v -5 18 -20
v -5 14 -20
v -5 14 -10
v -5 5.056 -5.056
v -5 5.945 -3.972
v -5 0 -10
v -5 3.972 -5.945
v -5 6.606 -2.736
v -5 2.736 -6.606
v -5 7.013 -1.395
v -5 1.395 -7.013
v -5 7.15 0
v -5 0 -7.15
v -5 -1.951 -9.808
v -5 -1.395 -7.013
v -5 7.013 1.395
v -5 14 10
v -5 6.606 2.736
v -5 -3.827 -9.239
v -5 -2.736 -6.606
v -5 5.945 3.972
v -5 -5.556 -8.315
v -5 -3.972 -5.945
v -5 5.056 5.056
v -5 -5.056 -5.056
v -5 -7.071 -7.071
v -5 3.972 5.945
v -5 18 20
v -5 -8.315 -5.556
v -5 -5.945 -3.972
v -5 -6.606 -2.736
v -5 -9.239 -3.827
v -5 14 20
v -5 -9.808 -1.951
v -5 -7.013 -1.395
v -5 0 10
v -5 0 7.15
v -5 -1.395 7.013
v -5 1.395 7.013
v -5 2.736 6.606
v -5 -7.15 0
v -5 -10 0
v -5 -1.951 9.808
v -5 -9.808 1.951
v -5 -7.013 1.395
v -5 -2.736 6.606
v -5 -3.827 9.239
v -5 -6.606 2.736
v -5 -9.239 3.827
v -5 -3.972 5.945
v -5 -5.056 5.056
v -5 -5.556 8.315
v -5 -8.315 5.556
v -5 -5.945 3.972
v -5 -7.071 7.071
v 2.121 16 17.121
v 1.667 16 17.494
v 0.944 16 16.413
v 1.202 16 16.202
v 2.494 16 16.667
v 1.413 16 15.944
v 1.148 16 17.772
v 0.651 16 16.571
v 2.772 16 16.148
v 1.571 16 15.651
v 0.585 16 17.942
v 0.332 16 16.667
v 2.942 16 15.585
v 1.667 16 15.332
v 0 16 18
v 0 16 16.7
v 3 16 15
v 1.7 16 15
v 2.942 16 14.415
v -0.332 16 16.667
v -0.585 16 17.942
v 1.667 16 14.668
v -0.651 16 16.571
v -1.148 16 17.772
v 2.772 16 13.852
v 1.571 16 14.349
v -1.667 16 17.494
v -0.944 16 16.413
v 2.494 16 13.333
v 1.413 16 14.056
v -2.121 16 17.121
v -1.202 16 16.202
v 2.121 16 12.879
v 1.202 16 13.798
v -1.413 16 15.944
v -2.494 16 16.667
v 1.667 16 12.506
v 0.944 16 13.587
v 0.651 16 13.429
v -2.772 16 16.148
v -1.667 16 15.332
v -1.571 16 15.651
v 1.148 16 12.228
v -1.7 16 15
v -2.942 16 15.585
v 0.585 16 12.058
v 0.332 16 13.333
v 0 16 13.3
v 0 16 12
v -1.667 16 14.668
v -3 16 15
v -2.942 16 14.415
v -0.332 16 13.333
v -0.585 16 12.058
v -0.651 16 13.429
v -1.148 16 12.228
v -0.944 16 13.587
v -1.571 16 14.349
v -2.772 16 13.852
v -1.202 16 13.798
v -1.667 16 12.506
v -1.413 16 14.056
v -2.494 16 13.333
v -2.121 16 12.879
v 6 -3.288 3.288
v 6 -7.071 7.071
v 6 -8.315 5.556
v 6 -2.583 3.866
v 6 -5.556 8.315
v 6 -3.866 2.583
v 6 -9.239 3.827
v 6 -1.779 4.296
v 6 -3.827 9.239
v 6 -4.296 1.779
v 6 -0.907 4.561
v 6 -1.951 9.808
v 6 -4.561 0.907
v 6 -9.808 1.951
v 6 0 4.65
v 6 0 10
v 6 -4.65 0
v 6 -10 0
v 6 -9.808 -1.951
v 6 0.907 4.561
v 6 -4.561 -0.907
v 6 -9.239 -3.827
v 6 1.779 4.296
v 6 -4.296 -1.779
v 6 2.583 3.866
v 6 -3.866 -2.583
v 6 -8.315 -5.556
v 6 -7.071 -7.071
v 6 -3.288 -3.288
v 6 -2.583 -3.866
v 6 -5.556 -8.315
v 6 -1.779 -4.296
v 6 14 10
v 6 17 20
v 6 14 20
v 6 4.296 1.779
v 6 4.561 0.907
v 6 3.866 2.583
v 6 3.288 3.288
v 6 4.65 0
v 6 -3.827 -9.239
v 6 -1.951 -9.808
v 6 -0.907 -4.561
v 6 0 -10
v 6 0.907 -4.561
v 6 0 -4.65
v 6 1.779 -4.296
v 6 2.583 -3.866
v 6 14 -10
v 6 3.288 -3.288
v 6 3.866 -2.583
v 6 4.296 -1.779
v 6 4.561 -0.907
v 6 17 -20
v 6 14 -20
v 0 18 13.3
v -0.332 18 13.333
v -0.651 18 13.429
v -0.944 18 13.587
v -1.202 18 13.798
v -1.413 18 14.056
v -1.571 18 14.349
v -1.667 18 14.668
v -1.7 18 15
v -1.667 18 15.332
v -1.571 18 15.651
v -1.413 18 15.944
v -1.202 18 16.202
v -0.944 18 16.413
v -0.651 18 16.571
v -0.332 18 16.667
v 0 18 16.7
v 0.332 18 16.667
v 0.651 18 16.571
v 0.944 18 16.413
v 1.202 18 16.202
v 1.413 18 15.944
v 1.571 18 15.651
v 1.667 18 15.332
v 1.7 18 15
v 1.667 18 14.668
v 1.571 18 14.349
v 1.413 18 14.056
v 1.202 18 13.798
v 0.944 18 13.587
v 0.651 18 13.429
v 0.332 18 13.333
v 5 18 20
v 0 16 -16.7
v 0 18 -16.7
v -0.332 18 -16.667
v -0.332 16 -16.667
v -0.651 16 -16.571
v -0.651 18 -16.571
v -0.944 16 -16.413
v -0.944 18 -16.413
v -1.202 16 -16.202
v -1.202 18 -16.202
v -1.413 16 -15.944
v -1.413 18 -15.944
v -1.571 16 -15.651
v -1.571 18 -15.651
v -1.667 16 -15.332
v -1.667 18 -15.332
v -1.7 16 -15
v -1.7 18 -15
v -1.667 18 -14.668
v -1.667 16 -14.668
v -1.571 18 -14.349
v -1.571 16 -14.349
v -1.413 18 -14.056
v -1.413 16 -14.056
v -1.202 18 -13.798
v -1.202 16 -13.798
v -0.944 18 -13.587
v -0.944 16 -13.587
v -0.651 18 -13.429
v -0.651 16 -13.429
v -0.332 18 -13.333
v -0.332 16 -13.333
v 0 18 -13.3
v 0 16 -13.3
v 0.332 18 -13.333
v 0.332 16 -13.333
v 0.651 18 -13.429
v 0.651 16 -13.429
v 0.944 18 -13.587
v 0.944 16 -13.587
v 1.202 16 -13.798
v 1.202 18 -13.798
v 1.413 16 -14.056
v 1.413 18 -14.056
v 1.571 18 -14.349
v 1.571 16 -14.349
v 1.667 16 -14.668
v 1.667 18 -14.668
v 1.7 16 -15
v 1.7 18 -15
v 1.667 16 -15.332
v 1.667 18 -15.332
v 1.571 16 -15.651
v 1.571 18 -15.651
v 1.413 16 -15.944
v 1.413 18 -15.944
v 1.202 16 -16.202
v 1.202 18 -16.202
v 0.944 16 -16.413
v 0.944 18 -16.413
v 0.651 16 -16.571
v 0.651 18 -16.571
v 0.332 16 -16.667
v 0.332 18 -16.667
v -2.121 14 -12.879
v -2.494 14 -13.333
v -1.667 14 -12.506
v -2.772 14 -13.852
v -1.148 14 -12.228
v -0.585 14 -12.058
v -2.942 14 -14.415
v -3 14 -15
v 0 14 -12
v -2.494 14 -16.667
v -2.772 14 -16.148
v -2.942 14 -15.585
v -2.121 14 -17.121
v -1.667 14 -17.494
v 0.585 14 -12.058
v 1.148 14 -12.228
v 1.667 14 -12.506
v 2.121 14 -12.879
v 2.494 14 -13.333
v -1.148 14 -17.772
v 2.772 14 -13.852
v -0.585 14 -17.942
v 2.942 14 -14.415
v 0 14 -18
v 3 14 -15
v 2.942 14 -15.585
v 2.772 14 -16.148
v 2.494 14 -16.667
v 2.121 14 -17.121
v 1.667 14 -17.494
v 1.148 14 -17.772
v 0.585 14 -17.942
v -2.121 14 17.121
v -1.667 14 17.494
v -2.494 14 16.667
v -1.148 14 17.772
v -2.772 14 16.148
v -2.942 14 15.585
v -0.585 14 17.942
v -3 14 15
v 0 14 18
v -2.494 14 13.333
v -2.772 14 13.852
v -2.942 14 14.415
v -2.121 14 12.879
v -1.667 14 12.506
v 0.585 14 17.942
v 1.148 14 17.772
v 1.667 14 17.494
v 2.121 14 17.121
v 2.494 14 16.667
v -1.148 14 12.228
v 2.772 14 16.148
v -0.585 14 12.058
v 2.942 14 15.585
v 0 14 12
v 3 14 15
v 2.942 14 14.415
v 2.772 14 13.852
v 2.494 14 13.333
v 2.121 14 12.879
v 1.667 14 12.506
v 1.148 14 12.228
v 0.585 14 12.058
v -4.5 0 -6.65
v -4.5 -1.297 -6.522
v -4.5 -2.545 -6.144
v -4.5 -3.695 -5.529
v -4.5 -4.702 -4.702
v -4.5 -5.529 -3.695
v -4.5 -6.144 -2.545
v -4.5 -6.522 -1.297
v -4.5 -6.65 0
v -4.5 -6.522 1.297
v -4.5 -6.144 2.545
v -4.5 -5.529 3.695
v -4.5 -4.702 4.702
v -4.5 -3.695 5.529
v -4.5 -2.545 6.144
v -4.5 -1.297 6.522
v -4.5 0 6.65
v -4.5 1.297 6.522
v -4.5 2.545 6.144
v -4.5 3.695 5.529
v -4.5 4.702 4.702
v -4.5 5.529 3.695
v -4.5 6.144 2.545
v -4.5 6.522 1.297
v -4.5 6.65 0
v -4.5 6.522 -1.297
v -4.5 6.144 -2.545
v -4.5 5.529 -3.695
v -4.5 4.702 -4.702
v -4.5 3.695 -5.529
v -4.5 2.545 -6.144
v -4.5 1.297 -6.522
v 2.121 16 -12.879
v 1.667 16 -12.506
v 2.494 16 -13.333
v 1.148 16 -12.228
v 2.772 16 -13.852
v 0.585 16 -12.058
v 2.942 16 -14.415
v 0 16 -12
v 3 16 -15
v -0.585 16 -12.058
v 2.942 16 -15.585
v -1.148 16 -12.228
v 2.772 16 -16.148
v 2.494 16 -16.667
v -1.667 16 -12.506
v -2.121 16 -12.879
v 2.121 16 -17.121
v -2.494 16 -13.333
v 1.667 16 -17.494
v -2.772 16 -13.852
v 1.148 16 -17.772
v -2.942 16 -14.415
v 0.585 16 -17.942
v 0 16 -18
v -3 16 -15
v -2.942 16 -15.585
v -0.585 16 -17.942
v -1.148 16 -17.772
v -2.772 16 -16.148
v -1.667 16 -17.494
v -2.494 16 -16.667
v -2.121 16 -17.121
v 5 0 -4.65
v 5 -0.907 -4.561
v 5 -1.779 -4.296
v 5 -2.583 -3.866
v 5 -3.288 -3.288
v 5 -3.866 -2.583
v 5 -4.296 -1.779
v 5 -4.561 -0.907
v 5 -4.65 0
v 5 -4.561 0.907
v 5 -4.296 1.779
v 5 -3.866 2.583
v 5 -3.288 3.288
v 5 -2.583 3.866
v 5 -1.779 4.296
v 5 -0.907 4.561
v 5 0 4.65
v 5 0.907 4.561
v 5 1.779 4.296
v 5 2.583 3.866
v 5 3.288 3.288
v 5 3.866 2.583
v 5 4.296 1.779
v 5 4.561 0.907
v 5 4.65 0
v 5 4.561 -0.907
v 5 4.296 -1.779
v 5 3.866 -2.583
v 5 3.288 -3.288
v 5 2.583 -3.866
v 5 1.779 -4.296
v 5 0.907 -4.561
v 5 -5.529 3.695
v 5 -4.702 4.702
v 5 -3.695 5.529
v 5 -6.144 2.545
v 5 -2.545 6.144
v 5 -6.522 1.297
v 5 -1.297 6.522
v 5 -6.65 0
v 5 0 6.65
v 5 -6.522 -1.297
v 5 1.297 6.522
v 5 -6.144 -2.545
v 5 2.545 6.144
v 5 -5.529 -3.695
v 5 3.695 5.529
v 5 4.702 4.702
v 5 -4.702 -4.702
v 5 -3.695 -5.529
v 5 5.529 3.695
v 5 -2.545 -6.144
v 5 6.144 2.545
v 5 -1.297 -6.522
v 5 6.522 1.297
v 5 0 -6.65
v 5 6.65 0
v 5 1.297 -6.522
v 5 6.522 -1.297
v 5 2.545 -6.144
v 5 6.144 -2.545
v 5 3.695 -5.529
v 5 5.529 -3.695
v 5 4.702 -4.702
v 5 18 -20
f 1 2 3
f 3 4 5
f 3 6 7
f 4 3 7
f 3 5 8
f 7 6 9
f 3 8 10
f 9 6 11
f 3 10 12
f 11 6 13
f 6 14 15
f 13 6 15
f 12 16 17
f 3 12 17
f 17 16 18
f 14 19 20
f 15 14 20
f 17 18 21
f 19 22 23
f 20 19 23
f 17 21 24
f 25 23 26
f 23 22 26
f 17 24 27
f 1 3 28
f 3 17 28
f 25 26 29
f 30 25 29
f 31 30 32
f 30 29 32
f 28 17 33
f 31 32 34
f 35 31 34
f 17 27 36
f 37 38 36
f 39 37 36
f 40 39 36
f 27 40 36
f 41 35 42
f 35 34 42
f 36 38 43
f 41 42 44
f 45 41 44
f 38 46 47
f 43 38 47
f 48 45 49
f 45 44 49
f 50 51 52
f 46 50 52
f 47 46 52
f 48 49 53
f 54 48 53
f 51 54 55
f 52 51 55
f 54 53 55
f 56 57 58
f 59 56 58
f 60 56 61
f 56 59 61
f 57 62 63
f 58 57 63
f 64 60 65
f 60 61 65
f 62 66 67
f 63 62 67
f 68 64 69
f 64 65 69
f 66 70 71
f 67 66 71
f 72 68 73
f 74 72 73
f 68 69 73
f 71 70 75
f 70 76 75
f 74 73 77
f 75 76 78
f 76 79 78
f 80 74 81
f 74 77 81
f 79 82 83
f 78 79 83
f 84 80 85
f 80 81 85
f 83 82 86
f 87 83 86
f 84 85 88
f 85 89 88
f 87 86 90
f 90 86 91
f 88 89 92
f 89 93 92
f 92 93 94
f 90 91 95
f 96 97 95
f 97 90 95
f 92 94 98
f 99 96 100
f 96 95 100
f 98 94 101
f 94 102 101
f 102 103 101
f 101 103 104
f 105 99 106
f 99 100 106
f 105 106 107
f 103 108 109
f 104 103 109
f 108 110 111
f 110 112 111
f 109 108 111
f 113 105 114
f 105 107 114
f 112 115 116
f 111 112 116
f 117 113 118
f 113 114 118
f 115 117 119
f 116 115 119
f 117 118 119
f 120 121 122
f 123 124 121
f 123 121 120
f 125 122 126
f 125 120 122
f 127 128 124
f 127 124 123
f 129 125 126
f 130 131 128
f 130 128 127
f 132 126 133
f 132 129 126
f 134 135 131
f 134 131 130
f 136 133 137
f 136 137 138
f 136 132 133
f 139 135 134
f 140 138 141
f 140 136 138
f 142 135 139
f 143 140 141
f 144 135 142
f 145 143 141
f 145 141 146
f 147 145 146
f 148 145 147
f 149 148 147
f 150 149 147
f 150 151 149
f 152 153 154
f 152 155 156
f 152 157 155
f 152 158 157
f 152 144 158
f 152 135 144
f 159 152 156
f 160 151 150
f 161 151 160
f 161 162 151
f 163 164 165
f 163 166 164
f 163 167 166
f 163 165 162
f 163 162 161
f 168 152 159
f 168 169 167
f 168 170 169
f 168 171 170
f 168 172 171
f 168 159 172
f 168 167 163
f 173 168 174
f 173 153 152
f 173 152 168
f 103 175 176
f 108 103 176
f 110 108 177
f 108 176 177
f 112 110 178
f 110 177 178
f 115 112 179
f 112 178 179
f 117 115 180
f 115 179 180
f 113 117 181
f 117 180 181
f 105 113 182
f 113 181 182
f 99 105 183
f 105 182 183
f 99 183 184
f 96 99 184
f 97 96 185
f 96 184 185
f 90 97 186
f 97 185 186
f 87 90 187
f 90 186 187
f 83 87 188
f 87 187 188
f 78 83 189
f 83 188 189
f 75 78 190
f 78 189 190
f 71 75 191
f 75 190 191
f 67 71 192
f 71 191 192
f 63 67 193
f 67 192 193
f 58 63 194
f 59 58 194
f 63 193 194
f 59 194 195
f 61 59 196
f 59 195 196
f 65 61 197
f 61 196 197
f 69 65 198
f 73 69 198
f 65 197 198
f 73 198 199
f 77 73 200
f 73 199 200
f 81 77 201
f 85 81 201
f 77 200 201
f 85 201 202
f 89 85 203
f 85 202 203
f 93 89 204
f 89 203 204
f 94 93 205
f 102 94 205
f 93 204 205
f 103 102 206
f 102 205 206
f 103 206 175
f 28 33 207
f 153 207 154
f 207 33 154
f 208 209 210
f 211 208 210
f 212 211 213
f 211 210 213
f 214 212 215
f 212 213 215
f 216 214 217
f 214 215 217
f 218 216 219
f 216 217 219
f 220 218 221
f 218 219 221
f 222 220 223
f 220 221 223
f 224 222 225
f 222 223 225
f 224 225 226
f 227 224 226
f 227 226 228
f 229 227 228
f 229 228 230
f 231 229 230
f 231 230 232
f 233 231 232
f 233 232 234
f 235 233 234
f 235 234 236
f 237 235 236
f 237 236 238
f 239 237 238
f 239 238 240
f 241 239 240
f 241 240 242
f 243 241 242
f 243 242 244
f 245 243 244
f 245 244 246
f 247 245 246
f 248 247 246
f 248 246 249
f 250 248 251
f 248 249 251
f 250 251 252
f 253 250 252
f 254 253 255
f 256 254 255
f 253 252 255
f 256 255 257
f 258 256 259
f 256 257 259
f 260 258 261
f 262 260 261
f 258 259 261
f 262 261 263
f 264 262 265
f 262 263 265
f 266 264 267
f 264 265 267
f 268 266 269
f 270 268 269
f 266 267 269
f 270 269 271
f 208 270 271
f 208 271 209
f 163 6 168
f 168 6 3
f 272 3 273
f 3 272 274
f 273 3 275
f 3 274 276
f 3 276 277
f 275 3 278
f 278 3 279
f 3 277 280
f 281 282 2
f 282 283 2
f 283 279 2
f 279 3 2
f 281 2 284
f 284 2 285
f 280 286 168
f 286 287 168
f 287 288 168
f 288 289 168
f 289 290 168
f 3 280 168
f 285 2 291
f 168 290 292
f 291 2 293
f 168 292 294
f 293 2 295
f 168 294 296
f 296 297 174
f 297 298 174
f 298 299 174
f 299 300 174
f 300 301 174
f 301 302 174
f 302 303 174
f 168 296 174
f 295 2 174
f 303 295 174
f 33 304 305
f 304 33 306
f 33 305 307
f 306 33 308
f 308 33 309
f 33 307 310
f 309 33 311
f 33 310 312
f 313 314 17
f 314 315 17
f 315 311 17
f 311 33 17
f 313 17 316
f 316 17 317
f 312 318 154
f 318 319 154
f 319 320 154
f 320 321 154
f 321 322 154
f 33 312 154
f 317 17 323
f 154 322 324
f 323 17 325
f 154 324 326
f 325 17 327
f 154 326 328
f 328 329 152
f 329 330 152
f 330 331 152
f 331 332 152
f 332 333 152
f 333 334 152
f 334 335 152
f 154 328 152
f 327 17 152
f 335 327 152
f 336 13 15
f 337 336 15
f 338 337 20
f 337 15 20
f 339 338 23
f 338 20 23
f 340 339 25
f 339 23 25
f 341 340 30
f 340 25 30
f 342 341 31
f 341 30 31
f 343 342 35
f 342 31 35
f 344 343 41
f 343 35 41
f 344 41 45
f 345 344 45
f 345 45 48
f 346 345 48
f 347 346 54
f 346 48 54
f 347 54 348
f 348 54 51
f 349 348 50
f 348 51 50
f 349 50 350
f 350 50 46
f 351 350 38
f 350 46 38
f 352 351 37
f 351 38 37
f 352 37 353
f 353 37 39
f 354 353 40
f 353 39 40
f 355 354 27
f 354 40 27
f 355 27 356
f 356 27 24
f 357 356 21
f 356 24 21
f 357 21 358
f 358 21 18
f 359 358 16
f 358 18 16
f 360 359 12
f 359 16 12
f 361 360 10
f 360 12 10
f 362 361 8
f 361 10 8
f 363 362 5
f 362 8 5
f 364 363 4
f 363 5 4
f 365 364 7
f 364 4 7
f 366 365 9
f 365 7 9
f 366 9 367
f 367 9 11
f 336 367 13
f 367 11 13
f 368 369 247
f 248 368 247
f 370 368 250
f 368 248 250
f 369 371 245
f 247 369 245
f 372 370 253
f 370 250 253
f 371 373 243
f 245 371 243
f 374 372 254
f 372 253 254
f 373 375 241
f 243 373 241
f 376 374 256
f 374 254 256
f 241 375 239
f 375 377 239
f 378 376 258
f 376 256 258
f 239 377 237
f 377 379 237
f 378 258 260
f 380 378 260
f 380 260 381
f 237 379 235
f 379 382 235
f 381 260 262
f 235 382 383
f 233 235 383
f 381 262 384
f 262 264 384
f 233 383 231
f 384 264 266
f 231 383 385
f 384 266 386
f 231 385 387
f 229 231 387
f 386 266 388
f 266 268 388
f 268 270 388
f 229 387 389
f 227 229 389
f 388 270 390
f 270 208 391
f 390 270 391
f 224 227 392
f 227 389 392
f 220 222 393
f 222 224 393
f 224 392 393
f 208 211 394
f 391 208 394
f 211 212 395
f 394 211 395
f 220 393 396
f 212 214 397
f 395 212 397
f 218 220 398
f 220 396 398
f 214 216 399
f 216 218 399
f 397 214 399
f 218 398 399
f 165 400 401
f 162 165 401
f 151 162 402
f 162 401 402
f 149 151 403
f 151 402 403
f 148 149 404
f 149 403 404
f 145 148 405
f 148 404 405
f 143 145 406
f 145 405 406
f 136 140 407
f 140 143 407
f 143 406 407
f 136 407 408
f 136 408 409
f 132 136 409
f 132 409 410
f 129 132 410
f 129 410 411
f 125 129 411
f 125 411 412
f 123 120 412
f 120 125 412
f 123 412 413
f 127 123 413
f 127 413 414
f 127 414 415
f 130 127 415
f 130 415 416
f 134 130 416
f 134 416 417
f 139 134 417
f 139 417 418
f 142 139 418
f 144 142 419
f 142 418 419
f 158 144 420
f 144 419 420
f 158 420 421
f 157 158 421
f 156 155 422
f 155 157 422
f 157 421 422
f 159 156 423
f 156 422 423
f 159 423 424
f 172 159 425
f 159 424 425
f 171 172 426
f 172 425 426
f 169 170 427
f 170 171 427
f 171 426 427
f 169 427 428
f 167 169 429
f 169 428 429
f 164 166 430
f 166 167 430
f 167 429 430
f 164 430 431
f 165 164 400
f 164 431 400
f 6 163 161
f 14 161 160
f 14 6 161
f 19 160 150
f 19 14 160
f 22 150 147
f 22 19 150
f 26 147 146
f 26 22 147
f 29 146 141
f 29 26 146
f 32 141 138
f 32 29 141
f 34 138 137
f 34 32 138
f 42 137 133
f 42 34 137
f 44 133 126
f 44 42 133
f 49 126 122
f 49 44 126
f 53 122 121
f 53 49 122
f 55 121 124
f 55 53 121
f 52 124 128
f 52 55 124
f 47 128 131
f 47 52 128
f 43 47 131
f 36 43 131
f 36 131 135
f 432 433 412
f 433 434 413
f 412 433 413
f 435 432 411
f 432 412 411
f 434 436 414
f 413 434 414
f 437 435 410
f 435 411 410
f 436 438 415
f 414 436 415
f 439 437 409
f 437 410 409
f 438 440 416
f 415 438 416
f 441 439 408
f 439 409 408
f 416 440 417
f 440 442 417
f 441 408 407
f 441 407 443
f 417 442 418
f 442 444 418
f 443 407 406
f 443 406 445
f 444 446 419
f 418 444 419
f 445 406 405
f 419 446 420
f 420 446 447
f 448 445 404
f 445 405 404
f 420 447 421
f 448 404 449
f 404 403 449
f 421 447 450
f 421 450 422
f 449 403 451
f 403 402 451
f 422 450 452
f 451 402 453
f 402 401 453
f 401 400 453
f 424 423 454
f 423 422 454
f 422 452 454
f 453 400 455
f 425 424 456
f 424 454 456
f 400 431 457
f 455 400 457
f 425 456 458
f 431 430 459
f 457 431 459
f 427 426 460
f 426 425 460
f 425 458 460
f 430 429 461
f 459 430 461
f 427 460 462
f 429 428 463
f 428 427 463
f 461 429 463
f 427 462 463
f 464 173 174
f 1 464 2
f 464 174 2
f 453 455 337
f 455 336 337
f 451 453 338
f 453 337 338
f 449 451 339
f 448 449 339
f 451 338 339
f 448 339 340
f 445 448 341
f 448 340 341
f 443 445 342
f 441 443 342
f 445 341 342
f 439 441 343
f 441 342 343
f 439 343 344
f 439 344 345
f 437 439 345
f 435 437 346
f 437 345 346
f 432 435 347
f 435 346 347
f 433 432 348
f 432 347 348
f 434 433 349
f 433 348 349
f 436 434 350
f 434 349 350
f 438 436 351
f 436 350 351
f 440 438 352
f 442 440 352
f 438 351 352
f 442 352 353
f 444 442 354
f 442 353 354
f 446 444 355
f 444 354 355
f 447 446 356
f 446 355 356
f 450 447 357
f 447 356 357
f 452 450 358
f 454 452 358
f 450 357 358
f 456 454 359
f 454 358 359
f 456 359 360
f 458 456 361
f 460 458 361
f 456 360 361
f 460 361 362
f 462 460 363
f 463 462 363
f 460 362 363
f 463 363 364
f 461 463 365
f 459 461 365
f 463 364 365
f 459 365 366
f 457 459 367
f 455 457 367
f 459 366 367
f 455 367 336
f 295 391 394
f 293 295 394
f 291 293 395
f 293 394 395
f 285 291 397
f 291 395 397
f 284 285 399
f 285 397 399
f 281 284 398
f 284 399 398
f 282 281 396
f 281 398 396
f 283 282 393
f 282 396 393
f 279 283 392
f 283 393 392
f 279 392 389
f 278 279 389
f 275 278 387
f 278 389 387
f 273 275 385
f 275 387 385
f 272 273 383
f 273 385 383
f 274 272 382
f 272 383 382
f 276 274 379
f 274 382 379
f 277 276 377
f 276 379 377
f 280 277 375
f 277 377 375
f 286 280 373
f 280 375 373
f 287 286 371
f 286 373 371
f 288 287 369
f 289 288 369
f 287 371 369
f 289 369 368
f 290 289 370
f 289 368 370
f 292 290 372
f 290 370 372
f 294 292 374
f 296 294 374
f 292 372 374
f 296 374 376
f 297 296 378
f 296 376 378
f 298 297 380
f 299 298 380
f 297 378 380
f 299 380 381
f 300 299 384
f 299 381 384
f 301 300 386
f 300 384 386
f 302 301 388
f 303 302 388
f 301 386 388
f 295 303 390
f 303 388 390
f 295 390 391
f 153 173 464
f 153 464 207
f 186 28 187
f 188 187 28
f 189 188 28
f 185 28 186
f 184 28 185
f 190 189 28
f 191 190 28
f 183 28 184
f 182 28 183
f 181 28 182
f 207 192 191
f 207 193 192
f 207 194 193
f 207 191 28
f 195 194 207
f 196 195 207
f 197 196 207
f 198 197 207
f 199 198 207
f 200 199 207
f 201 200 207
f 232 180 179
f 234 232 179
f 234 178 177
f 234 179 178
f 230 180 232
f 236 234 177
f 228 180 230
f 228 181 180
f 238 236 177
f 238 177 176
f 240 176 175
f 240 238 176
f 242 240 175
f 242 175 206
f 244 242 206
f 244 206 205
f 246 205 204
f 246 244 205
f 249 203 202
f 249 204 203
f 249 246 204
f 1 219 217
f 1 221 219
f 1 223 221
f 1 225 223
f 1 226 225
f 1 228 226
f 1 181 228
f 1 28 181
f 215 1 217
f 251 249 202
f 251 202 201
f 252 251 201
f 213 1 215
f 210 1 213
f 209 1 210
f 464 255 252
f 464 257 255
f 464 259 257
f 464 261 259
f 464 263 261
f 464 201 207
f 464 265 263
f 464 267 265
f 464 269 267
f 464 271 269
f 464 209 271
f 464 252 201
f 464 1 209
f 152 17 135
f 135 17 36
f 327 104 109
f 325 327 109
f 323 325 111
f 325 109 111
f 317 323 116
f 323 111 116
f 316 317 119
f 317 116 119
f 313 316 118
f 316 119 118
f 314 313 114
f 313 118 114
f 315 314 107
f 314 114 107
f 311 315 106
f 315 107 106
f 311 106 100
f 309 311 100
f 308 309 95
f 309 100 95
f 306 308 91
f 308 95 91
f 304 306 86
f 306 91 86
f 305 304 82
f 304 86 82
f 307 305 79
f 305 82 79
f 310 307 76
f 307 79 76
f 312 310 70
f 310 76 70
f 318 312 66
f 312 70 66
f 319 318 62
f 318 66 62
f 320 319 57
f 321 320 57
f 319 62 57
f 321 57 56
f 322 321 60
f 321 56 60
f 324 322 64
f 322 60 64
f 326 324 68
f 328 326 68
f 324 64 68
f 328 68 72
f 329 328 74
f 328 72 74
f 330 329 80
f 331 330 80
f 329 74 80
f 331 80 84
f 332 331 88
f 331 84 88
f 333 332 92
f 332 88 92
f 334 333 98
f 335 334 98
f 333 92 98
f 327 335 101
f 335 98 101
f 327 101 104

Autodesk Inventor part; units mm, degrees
ref_plane "YZ Plane" through (0, 0, 0) normal (1, 0, 0) x (0, 1, 0)
ref_plane "XZ Plane" through (0, 0, 0) normal (0, 1, 0) x (-1, 0, 0)
ref_plane "XY Plane" through (0, 0, 0) normal (0, 0, 1) x (1, 0, 0)
sketch "Sketch1" plane through (0, 0, 0) normal (1, 0, 0) x (0, 1, 0)
  line L0 (0, 0) -> (14, 0) construction
  line L1 (0, -10) -> (14, -10)
  line L2 (14, 10) -> (0, 10)
  arc A0 (0, 10) -> (0, -10) centre (0, 0) ccw
  arc A1 (14, -10) -> (14, 10) centre (14, 0) ccw construction
  line L3 (14, 10) -> (14, -10)
  point P0 (7, 0)
  dimension "d2" = 20
  dimension "d1" = 14
extrude "Extrusion1" add sketch "Sketch1" along normal mid plane 10
sketch "Sketch2" plane through (-5, 14, 10) normal (0, 1, 0) x (1, 0, 0)
  line L0 (0, -10) -> (10, -10)
  line L1 (10, -10) -> (10, 30)
  line L2 (10, 30) -> (0, 30)
  line L3 (0, 30) -> (0, -10)
  line L4 (0, 0) -> (0, 20) construction
  line L5 (0, 20) -> (10, 20) construction
  line L6 (10, 20) -> (10, 0) construction
  line L7 (10, 0) -> (0, 0) construction
  line L8 (0, 0) -> (0, 20) construction
  line L9 (10, 20) -> (10, 0) construction
  line L10 (0, 10) -> (10, 10) construction
  point P0 (5, 10)
  dimension "d28" = 40
extrude "Extrusion2" add sketch "Sketch2" along normal blind 4
sketch "Sketch3" plane through (-5, 14, 10) normal (0, -1, 0) x (1, 0, 0)
  line L0 (10, -30) -> (0, -30) projected
  line L1 (0, -30) -> (0, -20) projected
  line L2 (0, -20) -> (0, 0) projected
  line L3 (0, 0) -> (0, 10) projected
  line L4 (0, 10) -> (10, 10) projected
  line L5 (10, 10) -> (10, 0) projected
  line L6 (10, 0) -> (10, -20) projected
  line L7 (10, -20) -> (10, -30) projected
  line L8 (10, -20) -> (0, -20) projected
  line L9 (0, 0) -> (10, 0) projected
  line L10 (0, 10) -> (10, 10) projected
  point P0 (5, -10)
  point P1 (5, 5)
  point P2 (5, -25)
  point P3 (5, 10)
  point P4 (5, 10)
  point P5 (5, 10)
  dimension "d30" = 5
  dimension "d31" = 5
hole "Hole1" at (0, 14, 15) at (0, 14, -15) direction (0, 1, 0) diameter 3.4 end through all counterbore diameter 6 counterbore depth 2
sketch "Sketch5" plane through (5, 0, 0) normal (1, 0, 0) x (0, 0, -1)
  arc A0 (-10, 0) -> (10, 0) centre (0, 0) ccw projected
hole "Hole3" at (5, 0, 0) direction (-1, 0, 0) diameter 13 end through all
thicken "Thicken1" operation add thickness 0.15 both sides no extend neighbours yes toward (0, 0.0804666, -0.9967573) faces at (1.6667, 0.523, -6.4789)
sketch "Sketch6" plane through (5, 0, 0) normal (1, 0, 0) x (0, 0, -1)
  circle A0 centre (0, 0) radius 6.65 construction
  line L0 (20, 18) -> (20, 14) projected
  line L1 (20, 14) -> (10, 14) projected
  line L2 (10, 14) -> (10, 0) projected
  arc A1 (-10, 0) -> (10, 0) centre (0, 0) ccw projected
  line L3 (-10, 0) -> (-10, 14) projected
  line L4 (-10, 14) -> (-20, 14) projected
  line L5 (-20, 14) -> (-20, 18) projected
  line L6 (-20, 18) -> (20, 18) projected
  circle A2 centre (0, 0) radius 6.65 projected
  line L7 (20, 18) -> (20, 14) projected
  line L8 (20, 14) -> (10, 14) projected
  line L9 (10, 14) -> (10, 0) projected
  arc A3 (-10, 0) -> (10, 0) centre (0, 0) ccw projected
  line L10 (-10, 0) -> (-10, 14) projected
  line L11 (-10, 14) -> (-20, 14) projected
  line L12 (-20, 14) -> (-20, 18) projected
  line L13 (-20, 18) -> (20, 18) projected
  circle A4 centre (0, 0) radius 4.65
  dimension "d37" = 2
extrude "Extrusion3" add sketch "Sketch6" along normal blind 1 contours L0 L1 L2 A1 L3 L4 L5 L6 | A2
chamfer "Chamfer2" distance 0.5 angle 45 1 edges at (-5, 0, 6.65)
chamfer "Chamfer3" distance 1 angle 45 1 edges at (6, 18, 0)
equation "\"d31\" = d30"
equation "\"d21\" = diameter"
equation "\"diameter\" = 13"
properties part number "bearing holder"
